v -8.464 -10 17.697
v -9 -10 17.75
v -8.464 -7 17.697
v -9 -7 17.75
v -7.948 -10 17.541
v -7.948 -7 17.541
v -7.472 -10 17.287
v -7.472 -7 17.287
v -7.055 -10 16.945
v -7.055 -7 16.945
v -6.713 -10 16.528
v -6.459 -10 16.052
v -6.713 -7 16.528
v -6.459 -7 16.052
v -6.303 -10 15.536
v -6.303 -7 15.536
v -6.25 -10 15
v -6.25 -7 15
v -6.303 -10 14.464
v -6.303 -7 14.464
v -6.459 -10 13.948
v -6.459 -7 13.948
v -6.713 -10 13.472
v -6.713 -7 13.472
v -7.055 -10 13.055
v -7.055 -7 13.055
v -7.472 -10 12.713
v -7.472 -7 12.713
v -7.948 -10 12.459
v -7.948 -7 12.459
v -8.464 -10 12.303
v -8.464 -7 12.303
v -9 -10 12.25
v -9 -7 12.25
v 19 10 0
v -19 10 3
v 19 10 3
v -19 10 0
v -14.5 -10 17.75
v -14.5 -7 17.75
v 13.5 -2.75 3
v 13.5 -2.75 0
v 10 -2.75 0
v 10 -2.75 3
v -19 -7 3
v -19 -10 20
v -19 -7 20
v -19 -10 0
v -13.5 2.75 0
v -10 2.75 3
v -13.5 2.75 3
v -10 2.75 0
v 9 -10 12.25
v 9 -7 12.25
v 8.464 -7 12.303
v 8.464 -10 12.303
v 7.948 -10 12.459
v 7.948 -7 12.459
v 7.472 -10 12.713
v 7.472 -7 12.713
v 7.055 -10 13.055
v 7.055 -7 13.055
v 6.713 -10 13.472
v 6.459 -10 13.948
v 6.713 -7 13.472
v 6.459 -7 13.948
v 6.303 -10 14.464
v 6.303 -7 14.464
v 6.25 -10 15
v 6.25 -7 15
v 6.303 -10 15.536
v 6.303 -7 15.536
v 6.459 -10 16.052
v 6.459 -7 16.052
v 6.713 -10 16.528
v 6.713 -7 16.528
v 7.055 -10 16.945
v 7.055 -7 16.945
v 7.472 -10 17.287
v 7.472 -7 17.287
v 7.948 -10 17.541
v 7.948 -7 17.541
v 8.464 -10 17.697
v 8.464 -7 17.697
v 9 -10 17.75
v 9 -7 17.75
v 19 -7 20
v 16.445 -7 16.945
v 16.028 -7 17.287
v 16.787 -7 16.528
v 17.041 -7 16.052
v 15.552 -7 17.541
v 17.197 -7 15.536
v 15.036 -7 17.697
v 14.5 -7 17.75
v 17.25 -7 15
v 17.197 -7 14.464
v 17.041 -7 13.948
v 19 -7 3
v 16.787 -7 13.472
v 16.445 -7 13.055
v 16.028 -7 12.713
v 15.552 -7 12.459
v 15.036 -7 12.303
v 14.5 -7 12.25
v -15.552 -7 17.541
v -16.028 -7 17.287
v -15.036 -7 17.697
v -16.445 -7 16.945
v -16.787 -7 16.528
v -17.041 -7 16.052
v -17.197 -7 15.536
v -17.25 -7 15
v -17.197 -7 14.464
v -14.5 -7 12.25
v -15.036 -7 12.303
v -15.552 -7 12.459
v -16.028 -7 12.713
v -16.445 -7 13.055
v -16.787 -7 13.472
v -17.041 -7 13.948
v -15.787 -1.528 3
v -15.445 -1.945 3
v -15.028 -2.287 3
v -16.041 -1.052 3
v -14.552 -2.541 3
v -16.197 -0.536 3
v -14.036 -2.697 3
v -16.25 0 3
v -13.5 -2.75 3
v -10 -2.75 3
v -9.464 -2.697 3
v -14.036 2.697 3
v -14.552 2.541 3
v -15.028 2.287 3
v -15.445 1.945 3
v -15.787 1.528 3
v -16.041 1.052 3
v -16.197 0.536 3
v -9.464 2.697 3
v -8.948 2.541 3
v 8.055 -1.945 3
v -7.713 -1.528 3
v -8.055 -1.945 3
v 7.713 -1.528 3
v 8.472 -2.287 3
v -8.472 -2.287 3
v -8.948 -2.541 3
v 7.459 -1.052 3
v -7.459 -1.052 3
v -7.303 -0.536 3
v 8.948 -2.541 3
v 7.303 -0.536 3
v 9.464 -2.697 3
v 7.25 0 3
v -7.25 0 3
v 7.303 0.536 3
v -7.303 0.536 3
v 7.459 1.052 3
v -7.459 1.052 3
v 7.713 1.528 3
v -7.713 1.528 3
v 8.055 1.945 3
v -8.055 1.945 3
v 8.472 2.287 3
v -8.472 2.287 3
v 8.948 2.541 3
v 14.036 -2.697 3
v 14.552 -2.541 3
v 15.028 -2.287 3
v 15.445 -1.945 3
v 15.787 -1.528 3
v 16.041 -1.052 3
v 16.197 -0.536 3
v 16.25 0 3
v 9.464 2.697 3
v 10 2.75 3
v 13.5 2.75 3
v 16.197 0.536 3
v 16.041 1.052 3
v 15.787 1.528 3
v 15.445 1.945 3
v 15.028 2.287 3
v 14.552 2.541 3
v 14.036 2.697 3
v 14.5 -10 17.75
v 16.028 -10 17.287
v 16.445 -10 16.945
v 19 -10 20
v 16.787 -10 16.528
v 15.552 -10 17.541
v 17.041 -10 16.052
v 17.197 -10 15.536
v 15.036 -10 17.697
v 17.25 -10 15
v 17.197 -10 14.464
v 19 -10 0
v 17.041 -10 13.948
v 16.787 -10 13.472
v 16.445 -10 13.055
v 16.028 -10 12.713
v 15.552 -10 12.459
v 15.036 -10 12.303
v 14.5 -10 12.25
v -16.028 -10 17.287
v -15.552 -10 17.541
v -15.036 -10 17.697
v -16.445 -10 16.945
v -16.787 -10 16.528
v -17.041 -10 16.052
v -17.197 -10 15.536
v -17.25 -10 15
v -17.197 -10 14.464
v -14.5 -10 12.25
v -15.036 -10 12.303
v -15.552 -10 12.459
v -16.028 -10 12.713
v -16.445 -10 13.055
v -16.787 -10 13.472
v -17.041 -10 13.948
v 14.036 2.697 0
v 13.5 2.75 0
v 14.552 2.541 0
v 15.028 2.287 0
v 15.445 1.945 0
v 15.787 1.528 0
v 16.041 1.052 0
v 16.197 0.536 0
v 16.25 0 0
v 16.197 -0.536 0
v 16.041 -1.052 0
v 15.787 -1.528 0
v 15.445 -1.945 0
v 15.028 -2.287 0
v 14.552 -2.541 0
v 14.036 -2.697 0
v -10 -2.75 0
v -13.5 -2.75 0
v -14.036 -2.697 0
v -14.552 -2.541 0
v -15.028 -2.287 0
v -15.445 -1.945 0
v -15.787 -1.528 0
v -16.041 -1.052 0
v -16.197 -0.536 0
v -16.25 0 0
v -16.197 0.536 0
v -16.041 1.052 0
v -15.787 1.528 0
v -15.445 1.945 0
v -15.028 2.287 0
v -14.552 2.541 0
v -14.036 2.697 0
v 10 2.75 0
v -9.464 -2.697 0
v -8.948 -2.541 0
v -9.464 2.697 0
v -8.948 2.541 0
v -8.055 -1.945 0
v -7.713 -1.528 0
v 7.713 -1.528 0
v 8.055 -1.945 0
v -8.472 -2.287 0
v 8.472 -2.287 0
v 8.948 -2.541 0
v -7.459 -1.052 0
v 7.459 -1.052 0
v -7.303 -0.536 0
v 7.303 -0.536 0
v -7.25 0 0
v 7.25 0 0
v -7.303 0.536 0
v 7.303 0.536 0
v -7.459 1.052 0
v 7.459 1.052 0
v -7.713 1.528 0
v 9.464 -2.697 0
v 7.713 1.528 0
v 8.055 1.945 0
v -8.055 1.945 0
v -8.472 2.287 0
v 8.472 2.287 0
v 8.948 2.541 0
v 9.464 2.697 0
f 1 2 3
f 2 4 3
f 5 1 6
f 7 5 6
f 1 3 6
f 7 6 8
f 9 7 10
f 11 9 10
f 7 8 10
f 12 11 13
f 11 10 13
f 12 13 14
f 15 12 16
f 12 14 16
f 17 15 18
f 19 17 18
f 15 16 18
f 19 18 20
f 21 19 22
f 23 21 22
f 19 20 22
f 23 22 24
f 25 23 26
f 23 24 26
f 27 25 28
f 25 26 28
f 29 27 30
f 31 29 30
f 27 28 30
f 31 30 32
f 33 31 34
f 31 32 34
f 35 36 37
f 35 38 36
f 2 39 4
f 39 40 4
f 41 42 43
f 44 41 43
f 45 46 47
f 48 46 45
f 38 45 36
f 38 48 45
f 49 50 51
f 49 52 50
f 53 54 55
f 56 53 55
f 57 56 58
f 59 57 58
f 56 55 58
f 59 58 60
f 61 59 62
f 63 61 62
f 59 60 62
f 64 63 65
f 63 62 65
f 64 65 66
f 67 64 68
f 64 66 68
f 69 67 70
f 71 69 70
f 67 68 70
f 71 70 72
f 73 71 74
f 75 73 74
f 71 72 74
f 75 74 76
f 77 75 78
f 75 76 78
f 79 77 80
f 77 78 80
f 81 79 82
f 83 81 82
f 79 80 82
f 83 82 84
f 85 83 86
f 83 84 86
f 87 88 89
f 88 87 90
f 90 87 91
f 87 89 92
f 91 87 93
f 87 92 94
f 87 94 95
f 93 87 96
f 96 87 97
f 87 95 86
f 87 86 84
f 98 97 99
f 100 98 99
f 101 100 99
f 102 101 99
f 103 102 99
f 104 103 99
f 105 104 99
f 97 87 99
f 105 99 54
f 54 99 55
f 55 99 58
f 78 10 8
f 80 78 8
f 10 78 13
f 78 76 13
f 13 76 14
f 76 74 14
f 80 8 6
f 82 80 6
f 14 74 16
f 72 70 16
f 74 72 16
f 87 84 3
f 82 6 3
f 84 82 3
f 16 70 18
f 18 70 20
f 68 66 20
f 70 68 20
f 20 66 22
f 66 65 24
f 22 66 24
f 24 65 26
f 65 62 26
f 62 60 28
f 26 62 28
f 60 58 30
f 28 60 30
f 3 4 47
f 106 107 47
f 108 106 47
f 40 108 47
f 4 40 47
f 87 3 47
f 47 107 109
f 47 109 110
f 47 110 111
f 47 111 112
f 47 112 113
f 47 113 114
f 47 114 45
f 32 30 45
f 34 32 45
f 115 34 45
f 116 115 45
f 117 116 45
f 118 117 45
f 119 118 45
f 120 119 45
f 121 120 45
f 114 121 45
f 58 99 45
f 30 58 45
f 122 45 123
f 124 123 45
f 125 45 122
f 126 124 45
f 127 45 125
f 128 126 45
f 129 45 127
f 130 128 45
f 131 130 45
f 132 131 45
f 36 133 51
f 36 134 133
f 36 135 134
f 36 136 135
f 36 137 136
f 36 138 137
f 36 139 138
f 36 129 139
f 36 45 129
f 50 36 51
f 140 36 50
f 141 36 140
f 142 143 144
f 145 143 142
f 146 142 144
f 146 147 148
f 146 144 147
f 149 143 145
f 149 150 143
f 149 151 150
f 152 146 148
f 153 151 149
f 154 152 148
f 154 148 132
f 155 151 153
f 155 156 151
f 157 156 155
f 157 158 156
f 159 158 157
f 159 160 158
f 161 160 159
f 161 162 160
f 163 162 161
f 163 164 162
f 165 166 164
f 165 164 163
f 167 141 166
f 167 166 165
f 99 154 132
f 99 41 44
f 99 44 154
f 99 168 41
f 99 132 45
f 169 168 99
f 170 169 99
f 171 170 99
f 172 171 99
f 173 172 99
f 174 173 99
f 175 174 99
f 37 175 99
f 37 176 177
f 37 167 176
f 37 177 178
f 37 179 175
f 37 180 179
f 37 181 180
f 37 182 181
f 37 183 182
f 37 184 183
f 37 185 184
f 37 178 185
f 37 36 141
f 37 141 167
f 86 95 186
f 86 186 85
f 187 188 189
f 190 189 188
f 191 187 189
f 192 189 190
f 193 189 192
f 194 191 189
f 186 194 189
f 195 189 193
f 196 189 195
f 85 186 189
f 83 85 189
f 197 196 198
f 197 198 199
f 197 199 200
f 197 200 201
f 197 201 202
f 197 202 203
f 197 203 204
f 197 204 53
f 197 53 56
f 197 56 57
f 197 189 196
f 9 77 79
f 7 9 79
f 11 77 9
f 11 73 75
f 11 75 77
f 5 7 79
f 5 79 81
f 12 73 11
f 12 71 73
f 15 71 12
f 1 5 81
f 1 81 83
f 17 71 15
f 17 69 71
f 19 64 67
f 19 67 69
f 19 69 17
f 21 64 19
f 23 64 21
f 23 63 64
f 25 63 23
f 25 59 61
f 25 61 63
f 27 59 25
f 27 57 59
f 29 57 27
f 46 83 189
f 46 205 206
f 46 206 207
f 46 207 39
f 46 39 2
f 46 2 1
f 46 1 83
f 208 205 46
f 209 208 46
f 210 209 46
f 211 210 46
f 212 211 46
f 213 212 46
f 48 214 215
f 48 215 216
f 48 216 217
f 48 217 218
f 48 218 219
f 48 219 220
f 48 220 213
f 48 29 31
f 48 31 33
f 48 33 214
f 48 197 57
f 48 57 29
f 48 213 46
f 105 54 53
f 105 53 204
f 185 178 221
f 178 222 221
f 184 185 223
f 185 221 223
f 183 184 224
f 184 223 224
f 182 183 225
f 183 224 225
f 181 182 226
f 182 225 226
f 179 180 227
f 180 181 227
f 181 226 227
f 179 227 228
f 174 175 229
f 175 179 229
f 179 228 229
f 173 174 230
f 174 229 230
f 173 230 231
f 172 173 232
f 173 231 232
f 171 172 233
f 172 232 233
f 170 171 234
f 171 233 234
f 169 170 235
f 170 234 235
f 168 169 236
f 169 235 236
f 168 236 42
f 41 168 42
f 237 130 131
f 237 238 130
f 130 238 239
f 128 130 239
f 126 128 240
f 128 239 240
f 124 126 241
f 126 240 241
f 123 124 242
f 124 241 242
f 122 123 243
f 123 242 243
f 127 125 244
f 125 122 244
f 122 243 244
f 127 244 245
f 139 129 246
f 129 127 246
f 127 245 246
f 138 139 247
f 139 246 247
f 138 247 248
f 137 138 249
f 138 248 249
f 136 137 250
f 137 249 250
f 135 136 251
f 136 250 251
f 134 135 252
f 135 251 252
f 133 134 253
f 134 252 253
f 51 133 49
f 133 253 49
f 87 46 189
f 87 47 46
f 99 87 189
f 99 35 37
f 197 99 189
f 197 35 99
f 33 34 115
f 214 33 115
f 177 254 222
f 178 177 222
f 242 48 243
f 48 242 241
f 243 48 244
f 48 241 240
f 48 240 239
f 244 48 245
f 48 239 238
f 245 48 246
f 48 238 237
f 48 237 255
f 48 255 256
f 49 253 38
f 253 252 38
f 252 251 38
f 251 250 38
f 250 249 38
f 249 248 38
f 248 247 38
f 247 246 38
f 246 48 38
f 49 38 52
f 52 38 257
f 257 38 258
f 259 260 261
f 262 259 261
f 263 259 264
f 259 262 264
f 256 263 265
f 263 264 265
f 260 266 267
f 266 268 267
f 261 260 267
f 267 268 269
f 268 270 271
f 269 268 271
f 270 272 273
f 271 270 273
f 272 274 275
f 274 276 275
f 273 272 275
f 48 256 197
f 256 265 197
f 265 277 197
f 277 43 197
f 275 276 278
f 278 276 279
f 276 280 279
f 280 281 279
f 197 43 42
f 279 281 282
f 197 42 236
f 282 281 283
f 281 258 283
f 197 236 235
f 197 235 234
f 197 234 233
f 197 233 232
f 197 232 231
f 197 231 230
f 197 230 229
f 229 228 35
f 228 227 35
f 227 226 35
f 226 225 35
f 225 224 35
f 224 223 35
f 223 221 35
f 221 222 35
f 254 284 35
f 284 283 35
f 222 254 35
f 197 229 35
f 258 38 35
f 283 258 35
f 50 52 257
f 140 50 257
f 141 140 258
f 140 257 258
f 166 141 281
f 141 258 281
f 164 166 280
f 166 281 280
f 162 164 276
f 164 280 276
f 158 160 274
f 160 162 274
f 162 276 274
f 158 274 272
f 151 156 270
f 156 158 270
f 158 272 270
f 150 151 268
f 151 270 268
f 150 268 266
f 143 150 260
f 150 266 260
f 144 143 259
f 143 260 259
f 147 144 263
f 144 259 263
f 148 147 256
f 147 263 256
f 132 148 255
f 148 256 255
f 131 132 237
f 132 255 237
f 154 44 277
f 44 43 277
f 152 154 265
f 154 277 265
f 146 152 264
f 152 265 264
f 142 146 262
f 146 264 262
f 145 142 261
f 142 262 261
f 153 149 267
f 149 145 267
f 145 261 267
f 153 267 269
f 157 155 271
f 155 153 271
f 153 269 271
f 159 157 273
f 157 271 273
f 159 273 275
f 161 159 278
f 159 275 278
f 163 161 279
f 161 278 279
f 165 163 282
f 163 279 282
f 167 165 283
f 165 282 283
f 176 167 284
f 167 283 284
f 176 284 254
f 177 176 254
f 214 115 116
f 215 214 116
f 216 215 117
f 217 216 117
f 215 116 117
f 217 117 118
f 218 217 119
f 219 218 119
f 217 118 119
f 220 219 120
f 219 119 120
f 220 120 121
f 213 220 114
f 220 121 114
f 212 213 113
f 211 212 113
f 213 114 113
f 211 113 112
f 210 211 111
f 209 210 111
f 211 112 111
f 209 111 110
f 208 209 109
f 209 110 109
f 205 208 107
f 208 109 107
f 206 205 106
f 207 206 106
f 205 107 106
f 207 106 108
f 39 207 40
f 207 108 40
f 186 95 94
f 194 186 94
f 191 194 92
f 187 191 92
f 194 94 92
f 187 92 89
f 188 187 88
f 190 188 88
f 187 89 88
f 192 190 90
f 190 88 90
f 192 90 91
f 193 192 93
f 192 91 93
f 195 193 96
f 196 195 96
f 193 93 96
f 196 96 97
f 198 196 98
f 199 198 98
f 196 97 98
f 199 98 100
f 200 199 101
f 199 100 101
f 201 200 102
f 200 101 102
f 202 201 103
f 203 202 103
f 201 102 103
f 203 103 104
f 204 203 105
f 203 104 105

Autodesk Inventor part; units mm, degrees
ref_plane "YZ Plane" through (0, 0, 0) normal (1, 0, 0) x (0, 1, 0)
ref_plane "XZ Plane" through (0, 0, 0) normal (0, 1, 0) x (-1, 0, 0)
ref_plane "XY Plane" through (0, 0, 0) normal (0, 0, 1) x (1, 0, 0)
sketch "Sketch1" plane through (0, 0, 0) normal (0, 0, 1) x (1, 0, 0)
  line L0 (-19, 10) -> (19, 10)
  line L1 (19, 10) -> (19, -10)
  line L2 (19, -10) -> (-19, -10)
  line L3 (-19, -10) -> (-19, 10)
  line L4 (-19, 0) -> (19, 0) construction
  line L5 (-13.5, 0) -> (-10, 0) construction
  line L6 (-13.5, -2.75) -> (-10, -2.75)
  line L7 (-10, 2.75) -> (-13.5, 2.75)
  arc A0 (-13.5, 2.75) -> (-13.5, -2.75) centre (-13.5, 0) ccw
  arc A1 (-10, -2.75) -> (-10, 2.75) centre (-10, 0) ccw
  line L8 (0, 10) -> (0, -10) construction
  line L9 (13.5, 0) -> (10, 0) construction
  line L10 (13.5, -2.75) -> (10, -2.75)
  line L11 (10, 2.75) -> (13.5, 2.75)
  arc A2 (13.5, -2.75) -> (13.5, 2.75) centre (13.5, 0) ccw
  arc A3 (10, 2.75) -> (10, -2.75) centre (10, 0) ccw
  point P0 (0, 0)
  point P1 (-11.75, 0)
  point P2 (11.75, 0)
  dimension "d0" = 20
  dimension "d1" = 38
  dimension "d2" = 5.5
  dimension "d3" = 3.5
  dimension "d4" = 10
  dimension "d15" = 23.5
extrude "Extrusion1" add sketch "Sketch1" along normal blind 3
sketch "Sketch2" plane through (0, 0, 3) normal (0, 0, 1) x (1, 0, 0)
  line L0 (19, -10) -> (19, 10) projected
  line L1 (-19, -10) -> (19, -10)
  line L2 (19, -10) -> (19, -7)
  line L3 (19, -7) -> (-19, -7)
  line L4 (-19, -7) -> (-19, -10)
  point P0 (0, 0)
  dimension "d7" = 3
extrude "Extrusion2" add sketch "Sketch2" along normal blind 17
sketch "Sketch3" plane through (-19, -7, 3) normal (0, 1, 0) x (1, 0, 0)
  line L0 (0, 0) -> (0, -17) projected
  line L1 (38, -17) -> (0, -17) projected
  line L2 (38, 0) -> (38, -17) projected
  line L3 (0, -12) -> (38, -12) construction
  line L4 (4.5, -12) -> (10, -12) construction
  line L5 (4.5, -14.75) -> (10, -14.75)
  line L6 (10, -9.25) -> (4.5, -9.25)
  arc A0 (4.5, -9.25) -> (4.5, -14.75) centre (4.5, -12) ccw
  arc A1 (10, -14.75) -> (10, -9.25) centre (10, -12) ccw
  line L7 (0, 0) -> (38, 0) projected
  line L8 (19, 0) -> (19, -17) construction
  line L9 (33.5, -12) -> (28, -12) construction
  line L10 (33.5, -14.75) -> (28, -14.75)
  line L11 (28, -9.25) -> (33.5, -9.25)
  arc A2 (33.5, -14.75) -> (33.5, -9.25) centre (33.5, -12) ccw
  arc A3 (28, -9.25) -> (28, -14.75) centre (28, -12) ccw
  point P0 (19, 3)
  point P1 (7.25, -12)
  point P2 (19, -12)
  point P3 (30.75, -12)
  dimension "d10" = 5.5
  dimension "d11" = 5.5
  dimension "d12" = 5
  dimension "d16" = 23.5
extrude "Extrusion3" cut sketch "Sketch3" against normal up to surface (3 mm away) contours A0 L6 A1 L5 | L10 A3 L11 A2
properties part number "L bracket double"
